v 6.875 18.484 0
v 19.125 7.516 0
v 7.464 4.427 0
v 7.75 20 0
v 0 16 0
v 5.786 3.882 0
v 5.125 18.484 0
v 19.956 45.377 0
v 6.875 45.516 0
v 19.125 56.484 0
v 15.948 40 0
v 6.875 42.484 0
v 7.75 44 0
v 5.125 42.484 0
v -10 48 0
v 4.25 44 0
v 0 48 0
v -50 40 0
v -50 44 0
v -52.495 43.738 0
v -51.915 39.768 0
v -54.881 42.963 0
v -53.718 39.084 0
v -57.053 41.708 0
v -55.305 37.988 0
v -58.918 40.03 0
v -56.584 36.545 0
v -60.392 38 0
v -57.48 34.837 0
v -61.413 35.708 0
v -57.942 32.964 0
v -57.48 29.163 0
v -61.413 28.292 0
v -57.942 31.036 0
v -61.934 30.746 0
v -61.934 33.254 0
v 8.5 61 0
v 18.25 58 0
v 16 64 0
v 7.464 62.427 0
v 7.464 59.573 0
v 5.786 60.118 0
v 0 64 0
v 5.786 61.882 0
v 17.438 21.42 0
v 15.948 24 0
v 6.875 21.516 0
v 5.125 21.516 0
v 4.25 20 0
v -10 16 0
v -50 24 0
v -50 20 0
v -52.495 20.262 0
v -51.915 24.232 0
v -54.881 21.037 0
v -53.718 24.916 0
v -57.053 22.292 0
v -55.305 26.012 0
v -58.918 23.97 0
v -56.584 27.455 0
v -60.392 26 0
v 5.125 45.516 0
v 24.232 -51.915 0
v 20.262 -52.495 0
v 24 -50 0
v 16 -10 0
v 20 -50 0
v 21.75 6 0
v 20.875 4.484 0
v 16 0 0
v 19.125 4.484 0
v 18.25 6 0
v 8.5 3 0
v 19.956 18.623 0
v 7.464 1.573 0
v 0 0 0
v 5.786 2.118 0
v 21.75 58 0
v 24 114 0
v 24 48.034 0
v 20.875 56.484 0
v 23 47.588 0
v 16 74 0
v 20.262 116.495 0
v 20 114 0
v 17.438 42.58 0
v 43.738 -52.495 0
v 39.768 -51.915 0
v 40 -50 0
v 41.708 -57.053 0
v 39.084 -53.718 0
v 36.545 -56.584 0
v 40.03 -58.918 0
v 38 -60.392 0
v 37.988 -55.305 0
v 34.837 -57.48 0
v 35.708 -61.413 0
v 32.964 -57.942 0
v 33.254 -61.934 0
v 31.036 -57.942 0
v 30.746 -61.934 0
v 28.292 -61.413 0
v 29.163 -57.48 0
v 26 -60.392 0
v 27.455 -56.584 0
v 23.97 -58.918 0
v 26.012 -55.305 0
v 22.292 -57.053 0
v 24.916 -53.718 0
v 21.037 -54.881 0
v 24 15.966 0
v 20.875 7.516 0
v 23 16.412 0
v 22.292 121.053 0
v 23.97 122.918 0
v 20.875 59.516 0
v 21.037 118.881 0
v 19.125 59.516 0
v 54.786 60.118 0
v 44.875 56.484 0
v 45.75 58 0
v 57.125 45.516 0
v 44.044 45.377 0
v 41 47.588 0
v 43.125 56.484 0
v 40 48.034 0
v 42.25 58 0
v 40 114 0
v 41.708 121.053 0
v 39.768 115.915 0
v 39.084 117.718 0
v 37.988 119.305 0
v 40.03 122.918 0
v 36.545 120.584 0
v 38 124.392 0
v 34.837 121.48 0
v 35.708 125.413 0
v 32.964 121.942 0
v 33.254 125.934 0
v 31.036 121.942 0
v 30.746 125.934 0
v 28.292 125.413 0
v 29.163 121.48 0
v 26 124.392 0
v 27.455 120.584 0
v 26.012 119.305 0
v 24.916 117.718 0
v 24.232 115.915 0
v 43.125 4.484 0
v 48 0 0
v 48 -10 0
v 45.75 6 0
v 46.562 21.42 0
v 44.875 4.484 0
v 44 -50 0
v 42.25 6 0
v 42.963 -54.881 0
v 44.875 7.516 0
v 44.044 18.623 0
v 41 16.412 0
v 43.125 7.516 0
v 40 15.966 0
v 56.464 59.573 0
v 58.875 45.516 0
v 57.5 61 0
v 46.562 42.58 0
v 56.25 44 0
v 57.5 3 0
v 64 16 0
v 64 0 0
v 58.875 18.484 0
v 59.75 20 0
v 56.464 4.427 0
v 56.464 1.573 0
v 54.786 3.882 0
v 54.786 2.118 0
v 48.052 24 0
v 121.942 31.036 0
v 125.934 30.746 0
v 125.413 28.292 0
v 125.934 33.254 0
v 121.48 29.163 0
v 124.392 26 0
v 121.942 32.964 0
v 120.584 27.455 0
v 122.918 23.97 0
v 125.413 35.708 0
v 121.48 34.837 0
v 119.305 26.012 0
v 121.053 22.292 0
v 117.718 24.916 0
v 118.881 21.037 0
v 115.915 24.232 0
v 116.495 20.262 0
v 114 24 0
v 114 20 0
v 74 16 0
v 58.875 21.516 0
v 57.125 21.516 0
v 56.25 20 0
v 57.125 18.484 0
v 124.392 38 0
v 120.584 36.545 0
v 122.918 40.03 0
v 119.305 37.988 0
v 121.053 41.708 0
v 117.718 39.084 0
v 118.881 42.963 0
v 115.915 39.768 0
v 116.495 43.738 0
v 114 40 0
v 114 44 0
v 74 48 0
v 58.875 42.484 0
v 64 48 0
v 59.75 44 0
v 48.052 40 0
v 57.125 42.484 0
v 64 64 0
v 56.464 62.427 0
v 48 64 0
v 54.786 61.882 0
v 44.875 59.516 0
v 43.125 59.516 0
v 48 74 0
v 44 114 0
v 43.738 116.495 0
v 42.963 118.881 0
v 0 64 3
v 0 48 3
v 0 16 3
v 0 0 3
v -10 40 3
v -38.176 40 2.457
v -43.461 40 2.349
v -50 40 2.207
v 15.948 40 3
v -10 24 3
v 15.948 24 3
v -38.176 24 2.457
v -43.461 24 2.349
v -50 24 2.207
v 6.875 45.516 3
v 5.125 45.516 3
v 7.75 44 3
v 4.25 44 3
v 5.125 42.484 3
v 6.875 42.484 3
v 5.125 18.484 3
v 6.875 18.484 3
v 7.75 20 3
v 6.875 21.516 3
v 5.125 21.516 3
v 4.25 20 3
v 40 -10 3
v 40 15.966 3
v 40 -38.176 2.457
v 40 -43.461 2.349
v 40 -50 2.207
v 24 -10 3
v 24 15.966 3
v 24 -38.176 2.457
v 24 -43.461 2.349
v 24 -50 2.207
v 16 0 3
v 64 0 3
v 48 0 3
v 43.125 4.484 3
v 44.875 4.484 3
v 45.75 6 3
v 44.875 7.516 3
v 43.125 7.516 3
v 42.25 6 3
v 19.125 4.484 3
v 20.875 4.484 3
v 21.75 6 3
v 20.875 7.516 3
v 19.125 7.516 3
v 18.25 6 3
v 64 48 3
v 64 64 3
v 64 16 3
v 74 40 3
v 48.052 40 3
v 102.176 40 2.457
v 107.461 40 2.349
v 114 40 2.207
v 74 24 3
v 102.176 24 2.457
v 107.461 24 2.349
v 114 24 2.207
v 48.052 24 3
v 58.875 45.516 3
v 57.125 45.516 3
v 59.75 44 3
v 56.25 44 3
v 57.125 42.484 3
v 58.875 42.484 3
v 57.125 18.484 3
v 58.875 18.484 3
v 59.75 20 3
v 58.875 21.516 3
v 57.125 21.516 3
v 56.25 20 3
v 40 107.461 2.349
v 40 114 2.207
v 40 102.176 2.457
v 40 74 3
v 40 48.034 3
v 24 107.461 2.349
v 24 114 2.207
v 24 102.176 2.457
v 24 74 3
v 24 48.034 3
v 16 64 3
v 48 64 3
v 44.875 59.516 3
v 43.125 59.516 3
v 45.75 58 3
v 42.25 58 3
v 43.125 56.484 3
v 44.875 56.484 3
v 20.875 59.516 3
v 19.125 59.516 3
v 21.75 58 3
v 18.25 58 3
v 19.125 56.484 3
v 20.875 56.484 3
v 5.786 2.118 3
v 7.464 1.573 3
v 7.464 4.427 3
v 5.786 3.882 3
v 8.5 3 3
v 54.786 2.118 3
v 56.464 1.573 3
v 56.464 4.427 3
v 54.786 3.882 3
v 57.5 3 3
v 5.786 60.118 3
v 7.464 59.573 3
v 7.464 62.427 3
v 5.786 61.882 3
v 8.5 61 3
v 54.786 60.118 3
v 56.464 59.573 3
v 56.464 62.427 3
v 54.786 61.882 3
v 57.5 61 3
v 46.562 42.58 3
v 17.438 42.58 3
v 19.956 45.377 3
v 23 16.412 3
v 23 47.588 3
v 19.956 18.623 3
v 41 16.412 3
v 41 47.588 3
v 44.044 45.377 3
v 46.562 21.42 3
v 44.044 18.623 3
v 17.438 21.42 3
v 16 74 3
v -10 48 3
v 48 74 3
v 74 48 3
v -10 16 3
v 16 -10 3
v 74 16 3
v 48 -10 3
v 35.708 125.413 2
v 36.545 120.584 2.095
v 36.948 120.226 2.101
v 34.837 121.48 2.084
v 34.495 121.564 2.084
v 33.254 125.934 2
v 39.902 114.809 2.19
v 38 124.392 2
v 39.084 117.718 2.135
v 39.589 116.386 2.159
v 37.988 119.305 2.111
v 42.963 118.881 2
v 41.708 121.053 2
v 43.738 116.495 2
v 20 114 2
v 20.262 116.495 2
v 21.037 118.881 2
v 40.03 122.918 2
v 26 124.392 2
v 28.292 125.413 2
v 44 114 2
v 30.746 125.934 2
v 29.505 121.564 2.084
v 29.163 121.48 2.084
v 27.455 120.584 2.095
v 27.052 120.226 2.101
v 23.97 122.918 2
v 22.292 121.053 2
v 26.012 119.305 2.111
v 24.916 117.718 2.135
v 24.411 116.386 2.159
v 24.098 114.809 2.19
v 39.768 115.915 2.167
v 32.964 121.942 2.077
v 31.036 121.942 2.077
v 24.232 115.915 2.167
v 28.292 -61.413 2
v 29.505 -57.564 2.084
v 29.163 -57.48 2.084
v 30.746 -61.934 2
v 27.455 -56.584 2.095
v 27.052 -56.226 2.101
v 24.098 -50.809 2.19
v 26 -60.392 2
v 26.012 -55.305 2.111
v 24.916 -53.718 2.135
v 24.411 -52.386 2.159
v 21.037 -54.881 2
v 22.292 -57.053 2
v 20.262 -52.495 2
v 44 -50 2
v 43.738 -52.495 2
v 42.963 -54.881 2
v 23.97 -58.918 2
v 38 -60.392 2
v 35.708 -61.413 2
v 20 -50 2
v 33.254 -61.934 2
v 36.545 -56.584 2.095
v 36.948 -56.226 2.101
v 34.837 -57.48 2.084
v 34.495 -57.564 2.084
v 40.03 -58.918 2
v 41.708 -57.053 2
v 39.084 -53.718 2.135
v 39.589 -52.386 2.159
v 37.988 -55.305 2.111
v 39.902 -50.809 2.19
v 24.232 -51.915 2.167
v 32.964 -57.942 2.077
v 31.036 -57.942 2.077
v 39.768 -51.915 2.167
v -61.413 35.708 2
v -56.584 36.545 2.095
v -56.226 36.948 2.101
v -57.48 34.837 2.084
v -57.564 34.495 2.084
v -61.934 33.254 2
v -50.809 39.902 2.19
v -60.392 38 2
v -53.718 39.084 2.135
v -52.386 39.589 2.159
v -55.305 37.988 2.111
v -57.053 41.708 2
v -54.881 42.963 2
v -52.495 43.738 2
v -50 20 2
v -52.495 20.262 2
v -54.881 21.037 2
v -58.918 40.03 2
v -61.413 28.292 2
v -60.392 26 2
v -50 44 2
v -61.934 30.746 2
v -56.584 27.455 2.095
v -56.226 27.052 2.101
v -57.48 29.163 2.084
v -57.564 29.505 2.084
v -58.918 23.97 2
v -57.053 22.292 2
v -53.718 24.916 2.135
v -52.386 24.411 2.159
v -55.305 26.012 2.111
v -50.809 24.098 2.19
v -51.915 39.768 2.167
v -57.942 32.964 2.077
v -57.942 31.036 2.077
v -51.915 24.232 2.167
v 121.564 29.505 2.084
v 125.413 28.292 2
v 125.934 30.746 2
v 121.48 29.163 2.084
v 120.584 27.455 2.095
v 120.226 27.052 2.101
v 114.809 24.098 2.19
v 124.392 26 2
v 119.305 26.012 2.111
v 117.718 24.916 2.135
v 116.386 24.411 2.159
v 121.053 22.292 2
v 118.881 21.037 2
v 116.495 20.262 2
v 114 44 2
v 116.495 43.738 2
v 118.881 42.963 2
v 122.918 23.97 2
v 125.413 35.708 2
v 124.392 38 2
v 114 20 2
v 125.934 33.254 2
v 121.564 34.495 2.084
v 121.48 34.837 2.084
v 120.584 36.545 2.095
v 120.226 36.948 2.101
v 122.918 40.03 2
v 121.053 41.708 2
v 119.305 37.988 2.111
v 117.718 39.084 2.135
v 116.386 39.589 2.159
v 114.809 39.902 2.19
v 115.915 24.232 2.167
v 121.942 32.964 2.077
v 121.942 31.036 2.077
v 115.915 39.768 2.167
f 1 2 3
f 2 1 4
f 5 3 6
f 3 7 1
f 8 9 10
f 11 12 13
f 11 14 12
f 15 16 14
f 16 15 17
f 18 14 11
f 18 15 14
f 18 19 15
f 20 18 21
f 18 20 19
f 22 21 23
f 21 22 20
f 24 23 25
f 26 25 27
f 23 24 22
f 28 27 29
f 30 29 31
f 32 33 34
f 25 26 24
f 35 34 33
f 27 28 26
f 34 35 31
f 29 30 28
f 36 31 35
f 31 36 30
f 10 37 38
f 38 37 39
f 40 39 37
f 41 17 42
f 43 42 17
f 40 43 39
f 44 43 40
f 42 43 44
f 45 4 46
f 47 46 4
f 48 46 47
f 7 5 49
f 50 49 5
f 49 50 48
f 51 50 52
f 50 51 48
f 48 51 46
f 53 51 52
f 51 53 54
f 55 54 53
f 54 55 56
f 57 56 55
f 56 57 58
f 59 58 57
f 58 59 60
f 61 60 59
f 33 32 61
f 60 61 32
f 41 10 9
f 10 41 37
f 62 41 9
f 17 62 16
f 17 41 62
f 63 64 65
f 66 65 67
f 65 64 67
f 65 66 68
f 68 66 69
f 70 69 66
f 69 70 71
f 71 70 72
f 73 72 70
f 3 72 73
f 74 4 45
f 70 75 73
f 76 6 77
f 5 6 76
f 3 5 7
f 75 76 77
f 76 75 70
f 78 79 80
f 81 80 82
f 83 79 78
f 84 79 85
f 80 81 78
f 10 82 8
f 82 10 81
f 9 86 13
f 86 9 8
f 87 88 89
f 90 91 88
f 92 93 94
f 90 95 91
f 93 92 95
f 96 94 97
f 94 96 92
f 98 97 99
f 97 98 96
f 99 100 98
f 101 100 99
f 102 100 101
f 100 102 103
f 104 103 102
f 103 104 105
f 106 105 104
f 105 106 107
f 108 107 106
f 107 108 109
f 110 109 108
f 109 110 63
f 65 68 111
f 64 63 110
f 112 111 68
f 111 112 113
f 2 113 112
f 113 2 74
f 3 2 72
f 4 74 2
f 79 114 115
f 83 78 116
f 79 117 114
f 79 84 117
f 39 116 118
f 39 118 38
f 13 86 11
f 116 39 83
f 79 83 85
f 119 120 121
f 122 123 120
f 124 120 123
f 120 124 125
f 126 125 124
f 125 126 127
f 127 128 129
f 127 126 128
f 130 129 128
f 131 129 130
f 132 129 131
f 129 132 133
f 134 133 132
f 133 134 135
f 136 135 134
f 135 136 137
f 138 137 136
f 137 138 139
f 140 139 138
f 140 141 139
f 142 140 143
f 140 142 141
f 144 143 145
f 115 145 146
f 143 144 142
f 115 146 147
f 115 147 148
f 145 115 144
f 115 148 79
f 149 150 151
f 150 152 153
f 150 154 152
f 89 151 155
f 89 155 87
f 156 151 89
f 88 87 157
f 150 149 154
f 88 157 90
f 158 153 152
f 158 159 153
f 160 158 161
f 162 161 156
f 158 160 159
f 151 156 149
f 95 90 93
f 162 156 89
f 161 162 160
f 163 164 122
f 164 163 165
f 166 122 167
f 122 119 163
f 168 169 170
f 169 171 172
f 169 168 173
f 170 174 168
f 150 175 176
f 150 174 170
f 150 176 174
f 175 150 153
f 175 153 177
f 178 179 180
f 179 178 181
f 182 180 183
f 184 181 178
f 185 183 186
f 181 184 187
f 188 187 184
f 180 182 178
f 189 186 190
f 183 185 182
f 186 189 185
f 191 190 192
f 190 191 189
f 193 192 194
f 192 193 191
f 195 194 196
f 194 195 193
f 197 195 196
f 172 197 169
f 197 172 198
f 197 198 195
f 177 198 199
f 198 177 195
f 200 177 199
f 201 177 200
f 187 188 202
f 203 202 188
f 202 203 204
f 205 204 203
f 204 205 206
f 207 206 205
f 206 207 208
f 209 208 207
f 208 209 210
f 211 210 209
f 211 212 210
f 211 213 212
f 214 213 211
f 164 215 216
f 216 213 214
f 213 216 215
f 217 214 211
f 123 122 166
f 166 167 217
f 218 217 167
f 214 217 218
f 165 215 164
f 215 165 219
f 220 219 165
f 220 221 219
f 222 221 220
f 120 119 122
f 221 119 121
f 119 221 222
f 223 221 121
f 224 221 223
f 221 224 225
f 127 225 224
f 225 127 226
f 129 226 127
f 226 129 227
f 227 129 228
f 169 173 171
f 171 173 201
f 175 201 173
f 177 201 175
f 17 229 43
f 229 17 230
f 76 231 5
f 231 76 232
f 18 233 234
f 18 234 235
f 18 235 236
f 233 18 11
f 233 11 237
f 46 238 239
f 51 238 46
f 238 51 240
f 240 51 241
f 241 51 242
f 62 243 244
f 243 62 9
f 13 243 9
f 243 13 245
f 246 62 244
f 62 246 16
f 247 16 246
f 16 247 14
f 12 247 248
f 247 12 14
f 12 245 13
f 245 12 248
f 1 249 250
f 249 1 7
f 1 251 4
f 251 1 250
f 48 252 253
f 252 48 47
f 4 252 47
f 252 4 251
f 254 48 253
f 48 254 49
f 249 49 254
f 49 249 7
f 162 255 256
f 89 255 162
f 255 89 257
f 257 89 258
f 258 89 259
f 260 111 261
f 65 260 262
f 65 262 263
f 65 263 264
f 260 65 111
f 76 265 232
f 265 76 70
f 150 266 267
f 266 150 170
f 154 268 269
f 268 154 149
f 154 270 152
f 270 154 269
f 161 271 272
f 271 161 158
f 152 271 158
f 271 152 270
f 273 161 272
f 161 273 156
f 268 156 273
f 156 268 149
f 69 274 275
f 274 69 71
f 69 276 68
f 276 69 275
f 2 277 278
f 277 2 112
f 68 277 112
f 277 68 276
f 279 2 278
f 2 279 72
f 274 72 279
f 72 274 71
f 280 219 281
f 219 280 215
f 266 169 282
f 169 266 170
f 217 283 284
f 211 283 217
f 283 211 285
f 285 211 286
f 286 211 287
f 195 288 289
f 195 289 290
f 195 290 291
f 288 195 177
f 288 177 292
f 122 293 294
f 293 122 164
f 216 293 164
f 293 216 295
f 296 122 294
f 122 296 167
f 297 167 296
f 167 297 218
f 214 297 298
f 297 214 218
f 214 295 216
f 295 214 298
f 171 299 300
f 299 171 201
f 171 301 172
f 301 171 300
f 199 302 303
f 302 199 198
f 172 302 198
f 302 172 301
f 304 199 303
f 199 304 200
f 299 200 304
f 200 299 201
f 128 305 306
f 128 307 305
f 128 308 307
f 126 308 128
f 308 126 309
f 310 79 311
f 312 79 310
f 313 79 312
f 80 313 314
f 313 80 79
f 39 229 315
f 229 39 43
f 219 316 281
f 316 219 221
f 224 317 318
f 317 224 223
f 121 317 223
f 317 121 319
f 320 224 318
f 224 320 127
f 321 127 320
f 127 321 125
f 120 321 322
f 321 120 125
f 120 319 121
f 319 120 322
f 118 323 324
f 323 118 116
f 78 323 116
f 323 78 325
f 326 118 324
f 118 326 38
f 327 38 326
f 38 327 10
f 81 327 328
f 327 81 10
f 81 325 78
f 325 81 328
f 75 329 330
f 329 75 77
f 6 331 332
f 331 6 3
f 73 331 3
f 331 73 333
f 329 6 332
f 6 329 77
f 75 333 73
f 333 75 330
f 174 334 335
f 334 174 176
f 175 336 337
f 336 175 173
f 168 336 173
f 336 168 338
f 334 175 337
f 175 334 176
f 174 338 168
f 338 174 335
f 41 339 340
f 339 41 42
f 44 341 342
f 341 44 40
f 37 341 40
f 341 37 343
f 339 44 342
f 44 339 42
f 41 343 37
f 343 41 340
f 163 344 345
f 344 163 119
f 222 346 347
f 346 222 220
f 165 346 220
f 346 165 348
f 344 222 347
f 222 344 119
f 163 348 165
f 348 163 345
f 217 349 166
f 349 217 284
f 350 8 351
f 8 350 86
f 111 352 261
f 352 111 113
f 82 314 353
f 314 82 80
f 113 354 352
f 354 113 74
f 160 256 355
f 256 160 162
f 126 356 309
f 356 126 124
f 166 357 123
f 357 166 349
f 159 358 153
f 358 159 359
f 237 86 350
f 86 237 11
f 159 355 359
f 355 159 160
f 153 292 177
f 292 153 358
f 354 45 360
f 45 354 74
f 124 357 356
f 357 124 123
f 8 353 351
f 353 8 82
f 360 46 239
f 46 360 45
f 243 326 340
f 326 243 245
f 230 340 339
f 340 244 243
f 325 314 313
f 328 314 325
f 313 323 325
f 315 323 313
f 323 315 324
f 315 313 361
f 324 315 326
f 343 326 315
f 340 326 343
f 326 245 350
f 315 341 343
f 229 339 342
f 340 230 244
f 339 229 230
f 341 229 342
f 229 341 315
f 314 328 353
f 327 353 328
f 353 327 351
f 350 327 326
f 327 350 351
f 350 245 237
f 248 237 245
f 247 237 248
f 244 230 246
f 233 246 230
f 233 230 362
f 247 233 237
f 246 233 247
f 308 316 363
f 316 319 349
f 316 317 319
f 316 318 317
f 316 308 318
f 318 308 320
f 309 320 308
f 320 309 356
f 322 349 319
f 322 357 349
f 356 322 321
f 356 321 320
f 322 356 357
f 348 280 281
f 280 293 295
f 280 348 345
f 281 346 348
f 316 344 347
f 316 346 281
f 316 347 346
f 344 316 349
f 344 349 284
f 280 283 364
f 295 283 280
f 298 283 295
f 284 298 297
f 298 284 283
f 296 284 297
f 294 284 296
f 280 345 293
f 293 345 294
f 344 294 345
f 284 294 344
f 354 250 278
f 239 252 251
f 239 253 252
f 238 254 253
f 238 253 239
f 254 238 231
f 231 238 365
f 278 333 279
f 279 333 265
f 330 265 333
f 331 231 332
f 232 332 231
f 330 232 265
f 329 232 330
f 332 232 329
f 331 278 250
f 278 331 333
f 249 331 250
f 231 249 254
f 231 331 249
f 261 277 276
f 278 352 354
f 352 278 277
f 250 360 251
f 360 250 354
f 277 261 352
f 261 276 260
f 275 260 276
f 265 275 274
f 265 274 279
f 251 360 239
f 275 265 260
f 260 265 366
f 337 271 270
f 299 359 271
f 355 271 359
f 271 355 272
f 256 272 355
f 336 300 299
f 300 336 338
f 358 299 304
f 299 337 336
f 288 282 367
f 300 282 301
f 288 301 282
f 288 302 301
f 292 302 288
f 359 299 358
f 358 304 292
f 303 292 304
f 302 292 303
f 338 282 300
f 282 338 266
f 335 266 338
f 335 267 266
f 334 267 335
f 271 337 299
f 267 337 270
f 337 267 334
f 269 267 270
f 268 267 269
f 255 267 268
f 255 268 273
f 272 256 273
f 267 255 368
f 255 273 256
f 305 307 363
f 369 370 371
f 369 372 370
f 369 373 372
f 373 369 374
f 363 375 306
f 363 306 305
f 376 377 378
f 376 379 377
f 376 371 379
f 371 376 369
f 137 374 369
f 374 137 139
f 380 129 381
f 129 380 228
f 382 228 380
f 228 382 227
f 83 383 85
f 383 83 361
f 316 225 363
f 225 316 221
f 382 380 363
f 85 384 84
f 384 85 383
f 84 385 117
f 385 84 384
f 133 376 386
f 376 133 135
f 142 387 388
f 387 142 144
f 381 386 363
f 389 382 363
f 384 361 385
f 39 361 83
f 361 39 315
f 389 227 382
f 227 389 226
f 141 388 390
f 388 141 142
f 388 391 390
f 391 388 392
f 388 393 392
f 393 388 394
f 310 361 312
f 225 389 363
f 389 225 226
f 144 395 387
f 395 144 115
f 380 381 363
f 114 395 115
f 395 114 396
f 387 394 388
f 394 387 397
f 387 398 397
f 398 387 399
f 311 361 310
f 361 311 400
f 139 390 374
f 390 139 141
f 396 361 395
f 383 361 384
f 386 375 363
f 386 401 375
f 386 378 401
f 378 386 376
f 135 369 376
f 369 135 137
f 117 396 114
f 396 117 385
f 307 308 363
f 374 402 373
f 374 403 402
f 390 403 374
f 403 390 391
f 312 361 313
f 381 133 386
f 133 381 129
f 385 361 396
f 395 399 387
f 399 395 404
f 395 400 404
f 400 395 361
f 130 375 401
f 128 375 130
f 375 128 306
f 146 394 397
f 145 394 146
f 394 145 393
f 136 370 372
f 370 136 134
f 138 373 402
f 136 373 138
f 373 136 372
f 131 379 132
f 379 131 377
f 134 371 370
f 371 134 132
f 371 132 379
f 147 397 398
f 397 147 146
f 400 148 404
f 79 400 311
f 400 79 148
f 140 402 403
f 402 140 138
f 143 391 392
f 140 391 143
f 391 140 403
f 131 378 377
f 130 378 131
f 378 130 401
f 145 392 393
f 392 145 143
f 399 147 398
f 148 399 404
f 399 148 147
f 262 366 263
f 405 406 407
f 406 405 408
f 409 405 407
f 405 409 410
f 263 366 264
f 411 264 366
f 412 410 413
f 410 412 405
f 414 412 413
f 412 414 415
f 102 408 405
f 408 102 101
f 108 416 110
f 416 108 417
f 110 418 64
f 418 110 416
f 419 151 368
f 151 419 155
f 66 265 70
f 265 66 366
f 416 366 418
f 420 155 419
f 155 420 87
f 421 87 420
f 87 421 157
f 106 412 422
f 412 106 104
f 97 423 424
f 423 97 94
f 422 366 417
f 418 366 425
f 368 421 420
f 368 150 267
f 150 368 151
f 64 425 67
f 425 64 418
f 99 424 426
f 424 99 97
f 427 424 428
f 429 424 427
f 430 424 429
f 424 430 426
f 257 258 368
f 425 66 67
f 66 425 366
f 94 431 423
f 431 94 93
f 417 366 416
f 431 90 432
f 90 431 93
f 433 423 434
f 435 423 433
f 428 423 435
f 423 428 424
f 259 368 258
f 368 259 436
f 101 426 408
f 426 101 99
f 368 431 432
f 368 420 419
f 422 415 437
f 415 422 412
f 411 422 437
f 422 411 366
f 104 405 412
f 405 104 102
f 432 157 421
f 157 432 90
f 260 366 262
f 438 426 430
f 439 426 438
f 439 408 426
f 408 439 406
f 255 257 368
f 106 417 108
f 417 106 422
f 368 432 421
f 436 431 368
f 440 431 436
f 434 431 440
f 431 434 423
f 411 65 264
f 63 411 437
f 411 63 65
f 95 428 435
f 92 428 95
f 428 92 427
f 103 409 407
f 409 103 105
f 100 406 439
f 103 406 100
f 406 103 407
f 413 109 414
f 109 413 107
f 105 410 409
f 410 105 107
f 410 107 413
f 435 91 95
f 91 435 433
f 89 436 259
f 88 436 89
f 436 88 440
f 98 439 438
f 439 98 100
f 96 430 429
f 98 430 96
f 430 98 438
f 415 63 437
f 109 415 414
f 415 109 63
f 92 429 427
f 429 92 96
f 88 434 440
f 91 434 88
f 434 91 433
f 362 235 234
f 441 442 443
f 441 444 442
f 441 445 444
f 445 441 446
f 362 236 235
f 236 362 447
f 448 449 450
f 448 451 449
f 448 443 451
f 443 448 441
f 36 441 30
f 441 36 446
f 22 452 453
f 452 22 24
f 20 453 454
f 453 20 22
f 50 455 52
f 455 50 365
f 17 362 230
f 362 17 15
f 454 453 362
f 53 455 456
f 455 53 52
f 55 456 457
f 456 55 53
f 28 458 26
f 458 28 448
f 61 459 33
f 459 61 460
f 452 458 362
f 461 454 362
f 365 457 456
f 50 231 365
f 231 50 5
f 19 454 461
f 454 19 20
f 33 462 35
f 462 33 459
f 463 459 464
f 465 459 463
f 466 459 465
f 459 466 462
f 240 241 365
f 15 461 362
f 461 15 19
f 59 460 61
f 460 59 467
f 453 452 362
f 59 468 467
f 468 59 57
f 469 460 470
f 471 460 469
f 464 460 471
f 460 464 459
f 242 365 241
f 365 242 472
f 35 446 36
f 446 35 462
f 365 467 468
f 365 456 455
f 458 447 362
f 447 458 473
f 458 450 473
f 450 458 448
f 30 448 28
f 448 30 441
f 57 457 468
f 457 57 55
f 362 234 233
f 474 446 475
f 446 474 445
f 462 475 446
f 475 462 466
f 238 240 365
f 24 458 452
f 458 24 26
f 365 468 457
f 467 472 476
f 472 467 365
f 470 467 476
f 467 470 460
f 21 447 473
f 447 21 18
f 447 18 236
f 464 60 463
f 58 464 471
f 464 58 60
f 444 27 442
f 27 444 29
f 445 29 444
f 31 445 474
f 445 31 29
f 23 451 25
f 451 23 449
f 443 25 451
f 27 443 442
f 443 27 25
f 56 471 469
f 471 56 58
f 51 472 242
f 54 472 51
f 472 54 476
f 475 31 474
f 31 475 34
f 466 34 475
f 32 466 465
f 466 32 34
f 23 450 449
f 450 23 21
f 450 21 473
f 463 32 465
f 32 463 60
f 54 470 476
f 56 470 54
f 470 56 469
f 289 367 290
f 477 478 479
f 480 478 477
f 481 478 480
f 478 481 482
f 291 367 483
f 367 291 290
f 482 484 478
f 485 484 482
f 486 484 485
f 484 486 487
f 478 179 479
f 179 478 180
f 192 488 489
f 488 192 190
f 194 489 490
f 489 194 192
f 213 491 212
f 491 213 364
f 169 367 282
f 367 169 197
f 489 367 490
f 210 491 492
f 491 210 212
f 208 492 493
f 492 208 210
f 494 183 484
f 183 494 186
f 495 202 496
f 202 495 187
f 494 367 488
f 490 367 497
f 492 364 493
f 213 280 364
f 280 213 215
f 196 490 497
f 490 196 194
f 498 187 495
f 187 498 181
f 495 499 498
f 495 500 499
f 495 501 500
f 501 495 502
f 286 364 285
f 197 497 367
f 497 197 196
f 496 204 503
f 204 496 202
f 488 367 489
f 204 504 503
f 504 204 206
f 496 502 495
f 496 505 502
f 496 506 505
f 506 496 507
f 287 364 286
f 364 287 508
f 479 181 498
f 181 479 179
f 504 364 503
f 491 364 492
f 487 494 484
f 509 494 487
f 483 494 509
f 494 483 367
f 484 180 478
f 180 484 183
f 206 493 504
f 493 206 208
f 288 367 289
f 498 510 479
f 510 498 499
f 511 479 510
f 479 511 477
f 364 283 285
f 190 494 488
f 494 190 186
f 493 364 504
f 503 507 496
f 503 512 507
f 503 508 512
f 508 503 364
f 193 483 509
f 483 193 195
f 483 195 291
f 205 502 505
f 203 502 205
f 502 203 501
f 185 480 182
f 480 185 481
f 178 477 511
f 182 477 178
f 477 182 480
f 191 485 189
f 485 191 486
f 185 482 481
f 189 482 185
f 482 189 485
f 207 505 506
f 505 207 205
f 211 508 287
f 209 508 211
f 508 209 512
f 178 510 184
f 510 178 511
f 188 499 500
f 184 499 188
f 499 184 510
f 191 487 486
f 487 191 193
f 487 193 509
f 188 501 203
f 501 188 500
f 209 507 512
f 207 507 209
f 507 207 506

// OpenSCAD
// mounting pegs for pi a+
module pi_mount() {
  translate([0, 0, 0]) difference() {
    hull() {
      translate([0, 0, 2]) cylinder(r=3, h=3);
      cylinder(r=2.5, h=5);
    };
    cylinder(r=1.5, h=5);
  };
  translate([49, 0, 0]) difference() {
    hull() {
      translate([0, 0, 2]) cylinder(r=3, h=3);
      cylinder(r=2.5, h=5);
    };
    cylinder(r=1.5, h=5);
  };
  translate([0, 58, 0]) difference() {
    hull() {
      translate([0, 0, 2]) cylinder(r=3, h=3);
      cylinder(r=2.5, h=5);
    };
    cylinder(r=1.5, h=5);
  };
  translate([49, 58, 0]) difference() {
    hull() {
      translate([0, 0, 2]) cylinder(r=3, h=3);
      cylinder(r=2.5, h=5);
    };
    cylinder(r=1.5, h=5);
  };
};

// body piece for each layer
module body_layer() {
  difference() {
    cube([64, 64, 3]);
    union() {

      // the hole pattern
      translate([32, 32, 0]) cylinder(r=18, h=5);
      translate([8, 32, 0]) union() {
        translate([-8, -8, 0]) cube([16, 16, 5]);
        translate([-2, 12, 0]) cylinder(r=1.75, h=5);
        translate([-2, -12, 0]) cylinder(r=1.75, h=5);
      };
      translate([32, 8, 0]) union() {
        translate([-8, -8, 0]) cube([16, 16, 5]);
        translate([12, -2, 0]) cylinder(r=1.75, h=5);
        translate([-12, -2, 0]) cylinder(r=1.75, h=5);
      };
      translate([64-8, 32, 0]) union() {
        translate([-8, -8, 0]) cube([16, 16, 5]);
        translate([2, 12, 0]) cylinder(r=1.75, h=5);
        translate([2, -12, 0]) cylinder(r=1.75, h=5);
      };
      translate([32, 64-8, 0]) union() {
        translate([-8, -8, 0]) cube([16, 16, 5]);
        translate([12, 2, 0]) cylinder(r=1.75, h=5);
        translate([-12, 2, 0]) cylinder(r=1.75, h=5);
      };

      // holes for the pi mount
      translate([7, 3, 0]) union() {
        translate([0, 0, 0]) cylinder(r=1.5, h=5);
        translate([49, 0, 0]) cylinder(r=1.5, h=5);
        translate([0, 58, 0]) cylinder(r=1.5, h=5);
        translate([49, 58, 0]) cylinder(r=1.5, h=5);
      };
    };
  };
};

// one of the quad arms
module arm() {
  difference() {
    hull() {
      cube([32, 10, 3]);
      translate([16, 50, 0]) cylinder(r=12, h=2);
    };
    hull() {
      translate([8, 0, 0]) cube([16, 10, 5]);
      translate([16, 50, 0]) cylinder(r=8, h=5);
    };
  };
};


// ============
// the assembly
// ============

module pi_layer() {
  // main body layer
  translate([0, 0, 0]) body_layer();

  // arm
  translate([16, 64, 0]) rotate([0, 0, 000]) arm(); // protudes +y
  translate([48, 00, 0]) rotate([0, 0, 180]) arm(); // protudes -y
  translate([00, 16, 0]) rotate([0, 0, 090]) arm(); // protudes +x
  translate([64, 48, 0]) rotate([0, 0, 270]) arm(); // protudes -x

  // pi mount
  //translate([7, 3, 2]) pi_mount();
};
pi_layer();
